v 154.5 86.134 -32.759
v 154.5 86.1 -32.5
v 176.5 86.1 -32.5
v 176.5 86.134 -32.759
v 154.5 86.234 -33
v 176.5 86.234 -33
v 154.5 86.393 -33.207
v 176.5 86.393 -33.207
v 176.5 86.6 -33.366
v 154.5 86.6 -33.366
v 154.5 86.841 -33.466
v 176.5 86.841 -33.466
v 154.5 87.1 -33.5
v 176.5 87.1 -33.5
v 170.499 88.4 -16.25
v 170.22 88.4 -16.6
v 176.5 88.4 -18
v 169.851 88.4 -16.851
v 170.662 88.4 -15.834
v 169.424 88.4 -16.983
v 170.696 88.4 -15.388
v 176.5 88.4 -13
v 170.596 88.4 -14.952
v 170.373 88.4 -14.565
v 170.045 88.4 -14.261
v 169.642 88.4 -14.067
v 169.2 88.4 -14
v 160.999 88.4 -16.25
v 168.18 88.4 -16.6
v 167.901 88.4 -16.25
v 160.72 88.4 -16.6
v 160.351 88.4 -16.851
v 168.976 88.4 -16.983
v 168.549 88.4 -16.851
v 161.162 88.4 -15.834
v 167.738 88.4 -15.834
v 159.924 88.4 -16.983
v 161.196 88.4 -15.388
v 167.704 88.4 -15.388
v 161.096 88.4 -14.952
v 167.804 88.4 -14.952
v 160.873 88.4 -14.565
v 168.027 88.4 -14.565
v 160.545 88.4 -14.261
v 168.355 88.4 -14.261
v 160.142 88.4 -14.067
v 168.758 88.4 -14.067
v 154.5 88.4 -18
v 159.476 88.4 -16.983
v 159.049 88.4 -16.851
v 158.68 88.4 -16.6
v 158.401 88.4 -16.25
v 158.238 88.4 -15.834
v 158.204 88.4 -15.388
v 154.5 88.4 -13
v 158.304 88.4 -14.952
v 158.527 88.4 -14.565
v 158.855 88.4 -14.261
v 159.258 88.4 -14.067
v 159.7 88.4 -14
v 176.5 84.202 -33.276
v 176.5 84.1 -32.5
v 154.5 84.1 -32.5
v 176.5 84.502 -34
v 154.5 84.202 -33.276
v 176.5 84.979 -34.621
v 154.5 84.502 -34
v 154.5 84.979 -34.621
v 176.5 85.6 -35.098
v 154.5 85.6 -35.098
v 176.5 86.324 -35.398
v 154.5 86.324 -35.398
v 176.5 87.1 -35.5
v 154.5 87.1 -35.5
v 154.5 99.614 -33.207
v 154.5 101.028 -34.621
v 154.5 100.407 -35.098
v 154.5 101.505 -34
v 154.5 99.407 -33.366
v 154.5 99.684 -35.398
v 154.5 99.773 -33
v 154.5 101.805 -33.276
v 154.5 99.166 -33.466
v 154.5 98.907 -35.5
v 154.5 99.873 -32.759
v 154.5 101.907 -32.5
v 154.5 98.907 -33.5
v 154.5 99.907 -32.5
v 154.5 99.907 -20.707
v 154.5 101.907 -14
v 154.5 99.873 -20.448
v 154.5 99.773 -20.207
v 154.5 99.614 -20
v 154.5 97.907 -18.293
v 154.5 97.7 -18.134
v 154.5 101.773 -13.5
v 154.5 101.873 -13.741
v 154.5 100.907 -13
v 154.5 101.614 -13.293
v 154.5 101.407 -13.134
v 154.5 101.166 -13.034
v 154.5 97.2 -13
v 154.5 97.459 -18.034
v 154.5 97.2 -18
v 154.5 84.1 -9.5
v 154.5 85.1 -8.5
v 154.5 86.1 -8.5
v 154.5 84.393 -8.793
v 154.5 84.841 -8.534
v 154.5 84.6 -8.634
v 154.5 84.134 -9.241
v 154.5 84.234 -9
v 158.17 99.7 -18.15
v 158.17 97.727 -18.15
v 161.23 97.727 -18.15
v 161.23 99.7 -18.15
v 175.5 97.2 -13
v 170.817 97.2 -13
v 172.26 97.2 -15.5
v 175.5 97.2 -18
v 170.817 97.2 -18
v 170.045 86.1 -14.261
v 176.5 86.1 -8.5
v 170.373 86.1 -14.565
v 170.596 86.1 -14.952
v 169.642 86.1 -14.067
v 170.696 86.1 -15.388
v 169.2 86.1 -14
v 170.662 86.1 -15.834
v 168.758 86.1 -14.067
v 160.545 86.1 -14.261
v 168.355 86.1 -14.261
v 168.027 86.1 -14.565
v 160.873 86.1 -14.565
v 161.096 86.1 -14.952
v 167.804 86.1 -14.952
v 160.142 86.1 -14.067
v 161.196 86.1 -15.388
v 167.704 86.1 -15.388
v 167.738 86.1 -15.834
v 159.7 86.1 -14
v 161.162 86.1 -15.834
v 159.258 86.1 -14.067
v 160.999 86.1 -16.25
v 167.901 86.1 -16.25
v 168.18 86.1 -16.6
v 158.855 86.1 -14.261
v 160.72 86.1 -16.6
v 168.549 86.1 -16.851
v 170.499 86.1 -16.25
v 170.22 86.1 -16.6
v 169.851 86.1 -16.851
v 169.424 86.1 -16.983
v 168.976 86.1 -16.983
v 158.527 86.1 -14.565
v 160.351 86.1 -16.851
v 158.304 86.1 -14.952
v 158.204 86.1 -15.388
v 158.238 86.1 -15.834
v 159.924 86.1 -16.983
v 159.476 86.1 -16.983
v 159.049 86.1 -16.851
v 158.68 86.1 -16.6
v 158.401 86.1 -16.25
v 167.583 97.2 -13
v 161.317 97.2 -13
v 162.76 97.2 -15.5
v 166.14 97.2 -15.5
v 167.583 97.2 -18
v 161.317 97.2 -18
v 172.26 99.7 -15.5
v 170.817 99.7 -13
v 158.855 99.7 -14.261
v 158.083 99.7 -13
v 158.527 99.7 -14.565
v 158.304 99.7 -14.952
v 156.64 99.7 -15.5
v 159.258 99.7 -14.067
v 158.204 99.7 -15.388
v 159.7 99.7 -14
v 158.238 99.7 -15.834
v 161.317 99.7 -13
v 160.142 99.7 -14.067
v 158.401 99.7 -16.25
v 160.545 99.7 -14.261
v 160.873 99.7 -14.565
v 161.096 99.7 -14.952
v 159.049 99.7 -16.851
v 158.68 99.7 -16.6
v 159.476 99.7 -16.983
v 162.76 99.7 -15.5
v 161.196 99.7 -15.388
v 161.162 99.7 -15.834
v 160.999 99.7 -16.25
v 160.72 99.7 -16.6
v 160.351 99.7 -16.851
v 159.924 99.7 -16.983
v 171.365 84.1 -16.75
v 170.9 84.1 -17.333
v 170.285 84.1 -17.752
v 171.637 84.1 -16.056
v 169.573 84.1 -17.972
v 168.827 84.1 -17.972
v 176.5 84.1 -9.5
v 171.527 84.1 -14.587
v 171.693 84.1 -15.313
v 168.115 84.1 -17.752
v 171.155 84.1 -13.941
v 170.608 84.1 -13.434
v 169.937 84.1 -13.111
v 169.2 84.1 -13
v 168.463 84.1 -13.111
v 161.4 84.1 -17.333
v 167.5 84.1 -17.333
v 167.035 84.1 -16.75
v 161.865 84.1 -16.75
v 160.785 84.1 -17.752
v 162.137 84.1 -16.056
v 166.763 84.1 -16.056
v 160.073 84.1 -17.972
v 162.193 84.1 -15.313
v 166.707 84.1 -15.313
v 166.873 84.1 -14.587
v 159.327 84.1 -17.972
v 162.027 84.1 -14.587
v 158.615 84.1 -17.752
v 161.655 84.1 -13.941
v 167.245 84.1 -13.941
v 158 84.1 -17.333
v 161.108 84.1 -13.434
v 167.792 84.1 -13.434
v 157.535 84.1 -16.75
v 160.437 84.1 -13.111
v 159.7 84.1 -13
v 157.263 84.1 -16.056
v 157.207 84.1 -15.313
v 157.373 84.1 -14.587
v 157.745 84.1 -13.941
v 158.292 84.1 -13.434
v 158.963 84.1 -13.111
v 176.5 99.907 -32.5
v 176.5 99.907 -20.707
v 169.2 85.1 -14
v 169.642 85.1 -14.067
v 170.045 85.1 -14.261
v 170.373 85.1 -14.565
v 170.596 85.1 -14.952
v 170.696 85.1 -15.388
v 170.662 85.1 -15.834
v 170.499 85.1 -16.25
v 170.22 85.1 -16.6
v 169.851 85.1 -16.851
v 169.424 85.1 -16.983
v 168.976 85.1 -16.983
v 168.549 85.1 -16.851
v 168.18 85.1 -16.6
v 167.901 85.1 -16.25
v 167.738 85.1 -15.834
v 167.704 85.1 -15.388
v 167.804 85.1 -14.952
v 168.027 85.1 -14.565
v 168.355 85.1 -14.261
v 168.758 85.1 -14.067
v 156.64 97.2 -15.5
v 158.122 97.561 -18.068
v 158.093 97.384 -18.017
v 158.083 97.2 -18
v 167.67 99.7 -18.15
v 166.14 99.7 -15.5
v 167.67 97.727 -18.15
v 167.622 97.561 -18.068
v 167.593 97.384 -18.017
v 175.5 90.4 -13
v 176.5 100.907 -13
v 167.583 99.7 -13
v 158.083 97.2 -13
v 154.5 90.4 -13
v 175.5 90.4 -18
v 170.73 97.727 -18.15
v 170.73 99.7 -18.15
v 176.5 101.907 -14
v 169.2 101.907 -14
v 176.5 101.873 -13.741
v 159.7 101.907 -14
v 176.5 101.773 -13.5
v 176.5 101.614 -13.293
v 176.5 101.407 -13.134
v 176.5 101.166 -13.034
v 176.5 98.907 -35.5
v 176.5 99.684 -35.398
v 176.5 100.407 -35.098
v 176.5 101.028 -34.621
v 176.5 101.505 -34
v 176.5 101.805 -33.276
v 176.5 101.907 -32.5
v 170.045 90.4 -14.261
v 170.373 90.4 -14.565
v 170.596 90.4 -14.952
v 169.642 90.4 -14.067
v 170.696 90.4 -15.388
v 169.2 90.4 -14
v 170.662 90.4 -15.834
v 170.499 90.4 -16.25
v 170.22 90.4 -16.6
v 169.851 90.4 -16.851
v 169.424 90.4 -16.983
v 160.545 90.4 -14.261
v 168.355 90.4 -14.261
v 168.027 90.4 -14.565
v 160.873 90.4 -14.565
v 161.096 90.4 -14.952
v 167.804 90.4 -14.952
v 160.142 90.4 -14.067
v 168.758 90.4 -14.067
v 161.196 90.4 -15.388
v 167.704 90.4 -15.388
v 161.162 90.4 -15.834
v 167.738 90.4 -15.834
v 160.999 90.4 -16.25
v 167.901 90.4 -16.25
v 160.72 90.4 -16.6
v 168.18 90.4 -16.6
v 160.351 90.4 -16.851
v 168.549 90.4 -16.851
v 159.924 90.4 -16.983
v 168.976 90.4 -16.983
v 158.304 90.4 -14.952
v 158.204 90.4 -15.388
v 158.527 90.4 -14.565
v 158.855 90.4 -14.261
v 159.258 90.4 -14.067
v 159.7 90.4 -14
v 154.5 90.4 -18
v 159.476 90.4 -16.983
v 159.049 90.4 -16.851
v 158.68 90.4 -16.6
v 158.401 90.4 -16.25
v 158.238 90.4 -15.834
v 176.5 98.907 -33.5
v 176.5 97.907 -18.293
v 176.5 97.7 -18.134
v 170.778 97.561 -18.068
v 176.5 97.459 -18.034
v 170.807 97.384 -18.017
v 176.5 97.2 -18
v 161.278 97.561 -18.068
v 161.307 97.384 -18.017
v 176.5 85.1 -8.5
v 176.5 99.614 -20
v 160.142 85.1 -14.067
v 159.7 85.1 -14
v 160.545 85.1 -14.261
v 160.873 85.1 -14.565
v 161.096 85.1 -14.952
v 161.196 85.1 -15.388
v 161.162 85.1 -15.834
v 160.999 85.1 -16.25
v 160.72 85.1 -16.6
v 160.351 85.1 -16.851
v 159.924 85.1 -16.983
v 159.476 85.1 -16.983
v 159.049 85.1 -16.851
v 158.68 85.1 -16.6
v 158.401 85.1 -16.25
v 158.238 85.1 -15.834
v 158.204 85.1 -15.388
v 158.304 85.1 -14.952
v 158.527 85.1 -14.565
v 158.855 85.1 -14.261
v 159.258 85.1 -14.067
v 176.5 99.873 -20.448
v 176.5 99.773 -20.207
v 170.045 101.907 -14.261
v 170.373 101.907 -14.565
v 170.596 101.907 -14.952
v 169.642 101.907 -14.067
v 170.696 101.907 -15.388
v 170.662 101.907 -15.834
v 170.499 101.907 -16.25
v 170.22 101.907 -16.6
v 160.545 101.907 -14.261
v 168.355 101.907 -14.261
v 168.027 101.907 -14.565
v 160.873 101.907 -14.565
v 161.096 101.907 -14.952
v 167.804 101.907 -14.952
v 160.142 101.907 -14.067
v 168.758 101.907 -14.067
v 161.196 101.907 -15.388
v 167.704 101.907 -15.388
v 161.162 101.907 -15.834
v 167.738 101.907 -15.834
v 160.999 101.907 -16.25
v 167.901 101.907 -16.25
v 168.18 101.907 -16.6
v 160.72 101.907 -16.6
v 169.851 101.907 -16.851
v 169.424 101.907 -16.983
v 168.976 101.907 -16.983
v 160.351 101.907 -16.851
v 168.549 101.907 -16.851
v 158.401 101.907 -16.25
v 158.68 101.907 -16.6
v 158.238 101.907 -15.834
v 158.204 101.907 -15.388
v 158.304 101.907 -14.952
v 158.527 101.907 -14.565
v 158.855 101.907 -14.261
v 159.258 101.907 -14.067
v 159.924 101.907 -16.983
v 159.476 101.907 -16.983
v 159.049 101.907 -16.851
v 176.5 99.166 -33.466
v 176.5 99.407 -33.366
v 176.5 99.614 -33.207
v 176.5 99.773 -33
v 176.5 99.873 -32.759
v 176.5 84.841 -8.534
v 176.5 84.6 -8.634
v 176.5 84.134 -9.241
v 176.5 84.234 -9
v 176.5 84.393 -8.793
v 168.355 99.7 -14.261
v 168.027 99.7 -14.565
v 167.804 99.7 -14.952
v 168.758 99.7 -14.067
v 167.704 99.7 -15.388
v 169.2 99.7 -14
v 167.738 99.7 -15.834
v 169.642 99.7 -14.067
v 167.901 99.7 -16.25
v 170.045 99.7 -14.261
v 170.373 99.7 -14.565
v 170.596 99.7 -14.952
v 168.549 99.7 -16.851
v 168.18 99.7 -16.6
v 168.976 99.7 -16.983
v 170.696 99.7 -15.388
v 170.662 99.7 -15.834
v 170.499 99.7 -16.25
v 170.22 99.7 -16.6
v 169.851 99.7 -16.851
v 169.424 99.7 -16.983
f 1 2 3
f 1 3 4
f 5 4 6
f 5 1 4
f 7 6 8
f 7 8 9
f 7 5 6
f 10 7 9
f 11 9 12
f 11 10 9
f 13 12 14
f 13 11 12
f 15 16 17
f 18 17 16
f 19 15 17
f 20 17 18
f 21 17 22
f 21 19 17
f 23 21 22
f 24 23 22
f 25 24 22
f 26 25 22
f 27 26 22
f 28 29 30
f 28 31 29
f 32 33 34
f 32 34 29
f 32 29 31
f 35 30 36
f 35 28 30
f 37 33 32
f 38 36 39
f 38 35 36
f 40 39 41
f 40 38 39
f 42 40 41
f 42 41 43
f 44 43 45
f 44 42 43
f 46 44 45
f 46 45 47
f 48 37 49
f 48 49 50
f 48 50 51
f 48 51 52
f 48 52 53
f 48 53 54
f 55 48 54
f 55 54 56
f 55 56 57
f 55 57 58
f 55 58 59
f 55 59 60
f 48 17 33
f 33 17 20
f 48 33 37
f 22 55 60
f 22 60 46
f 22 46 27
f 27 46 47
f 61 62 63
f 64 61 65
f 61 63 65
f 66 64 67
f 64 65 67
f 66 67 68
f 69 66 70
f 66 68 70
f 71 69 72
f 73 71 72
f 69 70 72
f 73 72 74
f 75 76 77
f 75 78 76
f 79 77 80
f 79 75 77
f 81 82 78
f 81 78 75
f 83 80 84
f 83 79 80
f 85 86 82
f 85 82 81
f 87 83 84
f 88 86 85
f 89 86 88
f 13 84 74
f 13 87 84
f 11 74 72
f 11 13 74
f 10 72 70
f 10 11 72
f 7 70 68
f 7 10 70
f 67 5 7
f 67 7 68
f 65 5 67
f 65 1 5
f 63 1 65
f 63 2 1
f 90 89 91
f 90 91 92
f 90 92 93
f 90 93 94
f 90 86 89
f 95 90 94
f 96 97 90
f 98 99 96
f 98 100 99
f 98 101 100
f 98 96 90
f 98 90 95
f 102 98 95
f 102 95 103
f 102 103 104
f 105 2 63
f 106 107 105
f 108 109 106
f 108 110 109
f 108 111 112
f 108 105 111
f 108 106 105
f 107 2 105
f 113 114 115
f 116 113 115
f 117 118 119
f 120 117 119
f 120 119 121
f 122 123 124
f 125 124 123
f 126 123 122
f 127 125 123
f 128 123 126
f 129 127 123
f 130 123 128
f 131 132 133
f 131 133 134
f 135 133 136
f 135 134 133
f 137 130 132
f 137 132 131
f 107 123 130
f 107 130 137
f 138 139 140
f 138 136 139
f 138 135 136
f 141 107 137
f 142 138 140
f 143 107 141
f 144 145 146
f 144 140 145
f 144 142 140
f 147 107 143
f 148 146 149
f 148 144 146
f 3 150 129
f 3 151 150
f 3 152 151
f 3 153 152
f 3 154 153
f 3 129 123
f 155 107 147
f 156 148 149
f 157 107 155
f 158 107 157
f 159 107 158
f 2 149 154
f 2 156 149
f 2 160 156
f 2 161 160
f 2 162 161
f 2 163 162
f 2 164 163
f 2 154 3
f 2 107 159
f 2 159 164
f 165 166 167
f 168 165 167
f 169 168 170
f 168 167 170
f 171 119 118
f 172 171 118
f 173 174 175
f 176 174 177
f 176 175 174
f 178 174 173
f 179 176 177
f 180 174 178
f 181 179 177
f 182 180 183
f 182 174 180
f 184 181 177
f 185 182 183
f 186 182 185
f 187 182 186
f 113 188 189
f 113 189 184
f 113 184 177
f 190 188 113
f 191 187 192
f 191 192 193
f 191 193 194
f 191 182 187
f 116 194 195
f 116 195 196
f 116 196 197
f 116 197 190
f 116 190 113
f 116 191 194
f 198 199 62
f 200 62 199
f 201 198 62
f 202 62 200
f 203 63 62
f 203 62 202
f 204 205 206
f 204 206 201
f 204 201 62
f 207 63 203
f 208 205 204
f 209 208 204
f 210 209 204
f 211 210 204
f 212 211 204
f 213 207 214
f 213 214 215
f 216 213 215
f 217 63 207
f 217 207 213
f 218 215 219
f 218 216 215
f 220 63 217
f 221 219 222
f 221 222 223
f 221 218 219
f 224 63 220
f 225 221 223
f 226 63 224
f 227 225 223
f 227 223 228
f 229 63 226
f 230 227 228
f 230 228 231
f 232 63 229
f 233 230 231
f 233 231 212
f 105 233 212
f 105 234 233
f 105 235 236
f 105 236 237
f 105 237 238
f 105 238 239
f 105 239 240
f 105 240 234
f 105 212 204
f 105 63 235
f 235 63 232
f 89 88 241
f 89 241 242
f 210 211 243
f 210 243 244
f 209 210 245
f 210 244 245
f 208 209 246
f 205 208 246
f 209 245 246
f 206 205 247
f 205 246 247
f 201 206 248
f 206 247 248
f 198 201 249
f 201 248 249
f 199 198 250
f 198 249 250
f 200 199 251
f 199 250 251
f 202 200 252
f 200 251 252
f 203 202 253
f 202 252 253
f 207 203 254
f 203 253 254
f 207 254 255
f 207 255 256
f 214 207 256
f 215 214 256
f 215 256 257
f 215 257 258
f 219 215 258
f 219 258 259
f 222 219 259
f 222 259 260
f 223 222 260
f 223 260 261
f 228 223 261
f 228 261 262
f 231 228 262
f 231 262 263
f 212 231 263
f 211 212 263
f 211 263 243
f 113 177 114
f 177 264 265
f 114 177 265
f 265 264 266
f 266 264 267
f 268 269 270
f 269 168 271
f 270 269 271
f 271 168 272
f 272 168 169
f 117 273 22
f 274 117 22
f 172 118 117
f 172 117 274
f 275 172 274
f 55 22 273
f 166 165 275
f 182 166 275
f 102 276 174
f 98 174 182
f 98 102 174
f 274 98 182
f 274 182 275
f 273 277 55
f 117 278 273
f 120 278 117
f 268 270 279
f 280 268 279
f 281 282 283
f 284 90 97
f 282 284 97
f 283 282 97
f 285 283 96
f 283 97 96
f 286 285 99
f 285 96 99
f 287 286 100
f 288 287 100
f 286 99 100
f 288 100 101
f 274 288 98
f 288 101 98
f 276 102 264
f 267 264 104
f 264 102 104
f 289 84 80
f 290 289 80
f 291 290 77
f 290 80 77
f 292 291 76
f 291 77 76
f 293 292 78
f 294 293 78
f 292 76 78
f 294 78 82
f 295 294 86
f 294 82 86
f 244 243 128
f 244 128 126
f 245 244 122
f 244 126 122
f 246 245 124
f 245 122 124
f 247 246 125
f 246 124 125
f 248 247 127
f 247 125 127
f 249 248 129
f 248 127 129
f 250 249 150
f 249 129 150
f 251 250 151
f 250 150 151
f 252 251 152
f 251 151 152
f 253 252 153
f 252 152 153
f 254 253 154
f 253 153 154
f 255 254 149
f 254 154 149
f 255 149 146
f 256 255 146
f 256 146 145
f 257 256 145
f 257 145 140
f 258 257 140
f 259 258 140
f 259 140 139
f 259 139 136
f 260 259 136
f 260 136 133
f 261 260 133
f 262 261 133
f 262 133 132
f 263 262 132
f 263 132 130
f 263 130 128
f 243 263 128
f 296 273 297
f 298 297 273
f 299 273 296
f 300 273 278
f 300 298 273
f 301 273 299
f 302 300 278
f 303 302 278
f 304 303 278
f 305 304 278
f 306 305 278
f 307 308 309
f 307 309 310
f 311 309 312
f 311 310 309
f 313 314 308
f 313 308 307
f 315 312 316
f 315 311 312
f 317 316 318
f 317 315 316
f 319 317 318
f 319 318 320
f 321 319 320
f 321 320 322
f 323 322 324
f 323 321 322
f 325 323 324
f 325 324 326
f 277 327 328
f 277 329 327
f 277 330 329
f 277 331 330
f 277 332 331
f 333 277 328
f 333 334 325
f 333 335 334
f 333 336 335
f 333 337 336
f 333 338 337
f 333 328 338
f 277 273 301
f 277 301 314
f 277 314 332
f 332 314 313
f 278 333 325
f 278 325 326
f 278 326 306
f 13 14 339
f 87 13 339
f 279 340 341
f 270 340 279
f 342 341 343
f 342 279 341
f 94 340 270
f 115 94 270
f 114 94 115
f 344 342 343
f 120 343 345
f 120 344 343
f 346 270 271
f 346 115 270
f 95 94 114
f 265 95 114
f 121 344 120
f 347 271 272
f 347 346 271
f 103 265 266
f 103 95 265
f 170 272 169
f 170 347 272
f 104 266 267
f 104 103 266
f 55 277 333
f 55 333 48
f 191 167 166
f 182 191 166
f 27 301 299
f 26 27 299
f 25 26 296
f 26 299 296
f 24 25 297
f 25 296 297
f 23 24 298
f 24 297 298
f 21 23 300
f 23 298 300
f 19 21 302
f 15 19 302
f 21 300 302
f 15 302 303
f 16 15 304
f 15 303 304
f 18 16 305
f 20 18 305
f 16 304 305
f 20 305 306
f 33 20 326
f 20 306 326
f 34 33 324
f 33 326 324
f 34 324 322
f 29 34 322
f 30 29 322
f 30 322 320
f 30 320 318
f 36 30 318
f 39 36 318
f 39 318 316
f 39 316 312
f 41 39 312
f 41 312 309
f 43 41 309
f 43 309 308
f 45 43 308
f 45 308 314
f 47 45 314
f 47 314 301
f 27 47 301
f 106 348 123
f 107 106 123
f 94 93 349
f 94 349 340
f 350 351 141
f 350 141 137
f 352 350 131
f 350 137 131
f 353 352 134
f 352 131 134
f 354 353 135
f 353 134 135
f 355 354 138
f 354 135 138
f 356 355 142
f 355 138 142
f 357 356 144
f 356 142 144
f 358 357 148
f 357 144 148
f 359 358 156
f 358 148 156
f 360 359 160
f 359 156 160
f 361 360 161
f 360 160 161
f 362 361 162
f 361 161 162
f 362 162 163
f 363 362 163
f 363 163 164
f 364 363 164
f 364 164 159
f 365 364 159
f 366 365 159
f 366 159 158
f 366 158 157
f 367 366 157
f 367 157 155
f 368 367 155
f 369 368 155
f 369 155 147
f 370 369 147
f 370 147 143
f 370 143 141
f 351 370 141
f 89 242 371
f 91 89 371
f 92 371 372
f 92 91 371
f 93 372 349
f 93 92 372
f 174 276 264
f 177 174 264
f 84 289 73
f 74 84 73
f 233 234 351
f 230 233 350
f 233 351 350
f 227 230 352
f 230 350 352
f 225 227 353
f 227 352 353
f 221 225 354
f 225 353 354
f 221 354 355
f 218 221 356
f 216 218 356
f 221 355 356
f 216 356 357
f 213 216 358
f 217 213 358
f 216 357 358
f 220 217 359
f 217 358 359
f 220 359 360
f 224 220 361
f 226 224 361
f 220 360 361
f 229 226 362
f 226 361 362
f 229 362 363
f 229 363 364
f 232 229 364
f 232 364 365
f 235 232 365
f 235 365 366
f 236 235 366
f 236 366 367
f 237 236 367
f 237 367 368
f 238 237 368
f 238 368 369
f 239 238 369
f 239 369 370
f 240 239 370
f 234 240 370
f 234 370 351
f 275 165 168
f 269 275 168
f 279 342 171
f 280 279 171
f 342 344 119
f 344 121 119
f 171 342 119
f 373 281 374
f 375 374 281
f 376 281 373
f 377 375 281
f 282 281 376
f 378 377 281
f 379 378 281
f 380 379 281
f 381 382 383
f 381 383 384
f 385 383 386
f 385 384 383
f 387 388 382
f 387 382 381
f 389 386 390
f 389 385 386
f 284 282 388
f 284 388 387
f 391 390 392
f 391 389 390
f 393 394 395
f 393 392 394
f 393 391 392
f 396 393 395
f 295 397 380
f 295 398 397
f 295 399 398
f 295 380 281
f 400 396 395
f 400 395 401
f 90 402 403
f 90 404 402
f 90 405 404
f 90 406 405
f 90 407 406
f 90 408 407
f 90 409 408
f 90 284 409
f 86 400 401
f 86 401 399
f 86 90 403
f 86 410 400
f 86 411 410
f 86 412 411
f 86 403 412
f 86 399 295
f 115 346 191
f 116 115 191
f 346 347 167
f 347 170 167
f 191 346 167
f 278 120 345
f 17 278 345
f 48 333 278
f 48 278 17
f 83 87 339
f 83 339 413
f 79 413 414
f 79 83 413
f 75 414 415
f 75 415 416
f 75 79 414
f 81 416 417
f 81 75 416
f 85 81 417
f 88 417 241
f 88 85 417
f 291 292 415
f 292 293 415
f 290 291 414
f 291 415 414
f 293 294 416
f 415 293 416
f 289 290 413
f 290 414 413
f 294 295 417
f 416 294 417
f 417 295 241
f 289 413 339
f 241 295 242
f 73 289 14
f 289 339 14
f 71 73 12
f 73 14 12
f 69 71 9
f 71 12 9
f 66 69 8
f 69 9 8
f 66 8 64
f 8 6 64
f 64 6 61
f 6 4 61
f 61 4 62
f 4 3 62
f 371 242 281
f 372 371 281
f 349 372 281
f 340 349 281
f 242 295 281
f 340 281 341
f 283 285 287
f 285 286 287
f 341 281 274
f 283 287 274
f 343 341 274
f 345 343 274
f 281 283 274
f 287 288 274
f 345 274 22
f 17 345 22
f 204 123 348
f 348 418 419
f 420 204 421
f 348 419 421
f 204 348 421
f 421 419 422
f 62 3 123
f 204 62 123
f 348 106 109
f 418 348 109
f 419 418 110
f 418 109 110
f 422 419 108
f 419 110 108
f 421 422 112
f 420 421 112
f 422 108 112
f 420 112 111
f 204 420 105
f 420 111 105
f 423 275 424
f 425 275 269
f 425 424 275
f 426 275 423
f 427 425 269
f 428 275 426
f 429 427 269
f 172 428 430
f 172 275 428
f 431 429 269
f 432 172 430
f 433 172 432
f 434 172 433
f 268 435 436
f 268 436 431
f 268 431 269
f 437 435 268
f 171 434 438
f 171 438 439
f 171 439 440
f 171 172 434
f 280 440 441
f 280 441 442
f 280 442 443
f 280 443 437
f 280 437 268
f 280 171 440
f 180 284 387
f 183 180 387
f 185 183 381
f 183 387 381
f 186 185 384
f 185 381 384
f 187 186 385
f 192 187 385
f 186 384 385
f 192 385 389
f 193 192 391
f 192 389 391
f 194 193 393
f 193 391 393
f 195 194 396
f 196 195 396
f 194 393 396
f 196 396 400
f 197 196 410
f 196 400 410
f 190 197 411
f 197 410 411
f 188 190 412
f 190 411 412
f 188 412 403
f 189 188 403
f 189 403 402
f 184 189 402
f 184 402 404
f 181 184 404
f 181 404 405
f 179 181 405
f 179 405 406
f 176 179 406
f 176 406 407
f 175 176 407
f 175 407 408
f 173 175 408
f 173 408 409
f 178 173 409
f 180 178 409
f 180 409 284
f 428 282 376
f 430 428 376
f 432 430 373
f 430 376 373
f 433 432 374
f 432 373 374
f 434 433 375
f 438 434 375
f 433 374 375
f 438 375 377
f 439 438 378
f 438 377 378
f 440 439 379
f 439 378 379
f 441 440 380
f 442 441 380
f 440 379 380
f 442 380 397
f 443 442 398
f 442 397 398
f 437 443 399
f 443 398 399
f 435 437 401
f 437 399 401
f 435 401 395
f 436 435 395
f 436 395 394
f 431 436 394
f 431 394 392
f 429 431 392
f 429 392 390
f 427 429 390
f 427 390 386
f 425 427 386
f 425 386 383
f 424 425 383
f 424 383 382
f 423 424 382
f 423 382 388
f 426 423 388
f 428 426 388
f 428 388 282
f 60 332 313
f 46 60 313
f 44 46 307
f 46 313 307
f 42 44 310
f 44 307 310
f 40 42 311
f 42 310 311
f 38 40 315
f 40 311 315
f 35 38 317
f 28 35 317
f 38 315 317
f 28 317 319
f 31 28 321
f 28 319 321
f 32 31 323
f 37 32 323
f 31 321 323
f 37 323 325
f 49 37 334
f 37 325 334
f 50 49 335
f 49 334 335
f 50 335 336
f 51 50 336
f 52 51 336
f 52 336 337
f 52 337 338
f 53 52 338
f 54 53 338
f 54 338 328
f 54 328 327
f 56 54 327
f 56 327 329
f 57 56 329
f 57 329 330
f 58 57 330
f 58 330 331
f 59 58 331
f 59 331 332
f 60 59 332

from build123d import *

# Parameters (mm, degrees)
PAD007_DEPTH            = 22
SKETCH025_W             = 6.8
SKETCH025_H             = 6
POCKET_DEPTH            = 21
SKETCH026_R             = 1.5
POCKET001_DEPTH         = 17.808107
POCKET002_DEPTH         = 2.5
HOLE_D                  = 3
HOLE_DEPTH              = 25
HOLE_CSINK_D            = 5
HOLE_CSINK_ANGLE        = 90
BODY007_ROLL_ANGLE      = 90
BODY007_PLACEMENT_ANGLE = 90


with BuildPart() as part:
    # Sketch024 → Pad007 (new body)
    with BuildSketch(Plane.XY):
        with BuildLine():
            Line((4.707107, 1.5), (4.707107, -17))
            ThreePointArc((1.707107, -20), (3.828427, -19.12132), (4.707107, -17))
            Line((1.707107, -20), (-10.1, -20))
            ThreePointArc((-13.1, -17), (-12.22132, -19.12132), (-10.1, -20))
            Line((-13.1, -17), (-13.1, 6))
            ThreePointArc((-12.1, 7), (-12.807107, 6.707107), (-13.1, 6))
            Line((-12.1, 7), (-11.1, 7))
            Line((-11.1, 7), (-11.1, -17))
            ThreePointArc((-11.1, -17), (-10.807107, -17.707107), (-10.1, -18))
            Line((-10.1, -18), (1.707107, -18))
            ThreePointArc((1.707107, -18), (2.414214, -17.707107), (2.707107, -17))
            Line((2.707107, -17), (2.707107, -5.207107))
            ThreePointArc((2.707107, -5.207107), (2.630986, -4.824423), (2.414214, -4.5))
            Line((2.414214, -4.5), (0.707107, -2.792893))
            ThreePointArc((0.707107, -2.792893), (0.382683, -2.57612), (0, -2.5))
            Line((0, -2.5), (-8.8, -2.5))
            Line((-8.8, -2.5), (-8.8, 0))
            Line((-8.8, 0), (-8.8, 2.5))
            Line((-8.8, 2.5), (3.707107, 2.5))
            ThreePointArc((4.707107, 1.5), (4.414214, 2.207107), (3.707107, 2.5))
        make_face()
    extrude(amount=PAD007_DEPTH)

    # Sketch025 (on Face19 of Pad007) → Pocket (cut)
    with BuildSketch(Plane(origin=(0, 0, 0), x_dir=(1, 0, 0), z_dir=(0, 0, -1))):
        with Locations((-3.4, 0)):
            Rectangle(SKETCH025_W, SKETCH025_H)
    extrude(amount=-POCKET_DEPTH, mode=Mode.SUBTRACT)

    # Sketch026 (on Face1 of Pocket) → Pocket001 (cut, through all)
    with BuildSketch(Plane.YZ.offset(4.707107)):
        with Locations((0, 14.7)):
            Circle(SKETCH026_R)
        with Locations((0, 5.2)):
            Circle(SKETCH026_R)
    extrude(amount=-POCKET001_DEPTH, mode=Mode.SUBTRACT)

    # Sketch027 (on Face21 of Pocket001) → Pocket002 (cut)
    with BuildSketch(Plane(origin=(0, 0, 0), x_dir=(0, -1, 0), z_dir=(-1, 0, 0))):
        Polygon((0, 11.640044), (2.65, 13.170022), (2.65, 16.229978), (0, 17.759956), (-2.65, 16.229978), (-2.65, 13.170022), align=None)
        Polygon((0, 8.259956), (-2.65, 6.729978), (-2.65, 3.670022), (0, 2.140044), (2.65, 3.670022), (2.65, 6.729978), align=None)
    extrude(amount=-POCKET002_DEPTH, mode=Mode.SUBTRACT)

    # Hole
    with Locations(Plane(origin=(-13.1, 0, 0), x_dir=(0, -1, 0), z_dir=(-1, 0, 0))):
        with Locations((0, 14.7), (0, 5.2)):
            CounterSinkHole(HOLE_D / 2, HOLE_CSINK_D / 2, depth=HOLE_DEPTH, counter_sink_angle=HOLE_CSINK_ANGLE)


with BuildPart() as part_1:
    # Body007 roll: moved
    add(part.part.rotate(Axis((0, 0, 0), (1, 0, 0)), BODY007_ROLL_ANGLE))


with BuildPart() as part_2:
    # Body007 placement: moved
    add(part_1.part.moved(Location((154.5, 97.2, -15.5))).rotate(Axis((154.5, 97.2, -15.5), (0, 0, 1)), BODY007_PLACEMENT_ANGLE))


solid = part_2.part
